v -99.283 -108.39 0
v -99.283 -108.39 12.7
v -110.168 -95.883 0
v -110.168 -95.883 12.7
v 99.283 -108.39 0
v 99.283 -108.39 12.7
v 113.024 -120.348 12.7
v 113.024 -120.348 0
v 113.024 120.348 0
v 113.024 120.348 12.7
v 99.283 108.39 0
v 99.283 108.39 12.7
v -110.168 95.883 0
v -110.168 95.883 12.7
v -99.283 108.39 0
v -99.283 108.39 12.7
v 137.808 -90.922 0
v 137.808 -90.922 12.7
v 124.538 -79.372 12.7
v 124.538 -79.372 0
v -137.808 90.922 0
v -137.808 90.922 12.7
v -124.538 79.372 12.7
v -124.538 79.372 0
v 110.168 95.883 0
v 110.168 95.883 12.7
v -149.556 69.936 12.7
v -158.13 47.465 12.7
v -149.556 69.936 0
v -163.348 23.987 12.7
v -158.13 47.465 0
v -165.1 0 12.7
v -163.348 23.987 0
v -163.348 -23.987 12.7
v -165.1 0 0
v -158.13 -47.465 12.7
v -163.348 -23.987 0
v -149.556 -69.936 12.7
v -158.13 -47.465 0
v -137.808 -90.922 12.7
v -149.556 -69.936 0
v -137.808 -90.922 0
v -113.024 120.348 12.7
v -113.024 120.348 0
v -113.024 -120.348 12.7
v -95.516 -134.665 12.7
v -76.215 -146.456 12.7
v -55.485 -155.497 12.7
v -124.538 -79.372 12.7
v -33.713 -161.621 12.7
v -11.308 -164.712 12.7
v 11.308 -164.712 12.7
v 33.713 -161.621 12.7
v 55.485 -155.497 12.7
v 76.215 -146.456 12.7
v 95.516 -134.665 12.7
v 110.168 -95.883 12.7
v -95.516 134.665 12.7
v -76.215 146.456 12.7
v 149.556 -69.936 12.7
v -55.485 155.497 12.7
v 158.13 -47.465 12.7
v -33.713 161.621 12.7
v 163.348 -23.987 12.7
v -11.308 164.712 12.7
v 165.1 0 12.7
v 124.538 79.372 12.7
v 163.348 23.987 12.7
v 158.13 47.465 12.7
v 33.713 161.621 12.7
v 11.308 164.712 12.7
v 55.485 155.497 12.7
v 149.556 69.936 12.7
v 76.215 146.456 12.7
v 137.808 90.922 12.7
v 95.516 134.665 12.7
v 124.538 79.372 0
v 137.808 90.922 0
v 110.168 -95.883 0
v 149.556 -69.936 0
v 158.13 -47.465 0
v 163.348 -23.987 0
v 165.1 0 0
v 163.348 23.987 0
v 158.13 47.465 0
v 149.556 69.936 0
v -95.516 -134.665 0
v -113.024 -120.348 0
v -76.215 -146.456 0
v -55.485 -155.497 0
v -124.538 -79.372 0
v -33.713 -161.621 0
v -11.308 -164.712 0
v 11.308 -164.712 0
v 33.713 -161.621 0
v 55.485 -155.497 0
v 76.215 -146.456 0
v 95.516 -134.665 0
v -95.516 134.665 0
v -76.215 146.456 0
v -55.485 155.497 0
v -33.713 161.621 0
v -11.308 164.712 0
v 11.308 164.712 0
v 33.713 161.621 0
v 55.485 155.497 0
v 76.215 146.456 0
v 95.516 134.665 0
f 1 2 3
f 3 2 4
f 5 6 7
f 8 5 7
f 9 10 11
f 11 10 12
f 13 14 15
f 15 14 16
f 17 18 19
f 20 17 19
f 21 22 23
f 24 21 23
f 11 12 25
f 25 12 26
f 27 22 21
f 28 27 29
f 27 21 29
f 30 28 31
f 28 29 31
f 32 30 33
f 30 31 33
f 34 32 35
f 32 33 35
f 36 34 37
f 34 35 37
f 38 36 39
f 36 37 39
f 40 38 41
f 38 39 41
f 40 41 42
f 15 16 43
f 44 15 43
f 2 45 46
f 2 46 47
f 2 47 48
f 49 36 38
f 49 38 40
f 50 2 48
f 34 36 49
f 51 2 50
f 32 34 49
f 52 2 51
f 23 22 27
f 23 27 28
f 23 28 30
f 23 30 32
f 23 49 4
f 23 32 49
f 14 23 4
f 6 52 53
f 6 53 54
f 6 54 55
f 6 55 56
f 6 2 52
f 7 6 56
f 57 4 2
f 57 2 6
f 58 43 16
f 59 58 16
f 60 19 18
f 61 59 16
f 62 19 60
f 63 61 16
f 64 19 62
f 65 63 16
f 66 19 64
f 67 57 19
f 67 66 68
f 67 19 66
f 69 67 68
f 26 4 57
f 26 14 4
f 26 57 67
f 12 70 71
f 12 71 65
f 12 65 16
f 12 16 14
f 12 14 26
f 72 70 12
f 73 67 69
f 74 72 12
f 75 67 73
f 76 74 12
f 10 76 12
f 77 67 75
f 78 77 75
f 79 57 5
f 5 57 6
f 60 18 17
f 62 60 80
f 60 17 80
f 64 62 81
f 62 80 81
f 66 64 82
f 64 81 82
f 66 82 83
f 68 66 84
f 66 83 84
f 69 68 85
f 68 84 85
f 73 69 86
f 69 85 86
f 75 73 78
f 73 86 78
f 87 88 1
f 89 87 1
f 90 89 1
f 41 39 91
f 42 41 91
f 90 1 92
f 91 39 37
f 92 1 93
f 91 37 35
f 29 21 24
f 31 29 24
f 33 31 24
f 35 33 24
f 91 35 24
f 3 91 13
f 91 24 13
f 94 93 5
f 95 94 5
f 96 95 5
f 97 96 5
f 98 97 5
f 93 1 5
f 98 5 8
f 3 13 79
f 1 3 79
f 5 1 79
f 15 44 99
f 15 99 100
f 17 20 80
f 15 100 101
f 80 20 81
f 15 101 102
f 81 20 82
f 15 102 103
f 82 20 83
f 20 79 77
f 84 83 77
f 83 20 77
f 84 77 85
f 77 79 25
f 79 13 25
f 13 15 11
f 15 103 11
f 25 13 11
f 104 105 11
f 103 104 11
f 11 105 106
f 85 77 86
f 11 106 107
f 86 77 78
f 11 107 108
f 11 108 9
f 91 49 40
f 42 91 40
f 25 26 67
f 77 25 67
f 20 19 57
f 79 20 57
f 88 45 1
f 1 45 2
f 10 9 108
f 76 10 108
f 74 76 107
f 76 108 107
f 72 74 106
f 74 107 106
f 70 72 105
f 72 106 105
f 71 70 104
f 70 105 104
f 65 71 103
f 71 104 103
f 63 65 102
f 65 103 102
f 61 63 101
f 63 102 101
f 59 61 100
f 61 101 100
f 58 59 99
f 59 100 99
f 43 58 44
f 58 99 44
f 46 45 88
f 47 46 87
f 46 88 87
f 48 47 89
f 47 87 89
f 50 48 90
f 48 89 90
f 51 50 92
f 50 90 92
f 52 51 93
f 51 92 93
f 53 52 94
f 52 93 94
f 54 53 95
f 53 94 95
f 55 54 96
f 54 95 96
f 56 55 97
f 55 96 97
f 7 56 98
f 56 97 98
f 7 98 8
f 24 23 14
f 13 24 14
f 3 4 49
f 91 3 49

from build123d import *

# Parameters (mm, degrees)
F0_R     = 165.1
F1_DEPTH = 12.7
F3_DEPTH = 25.4


with BuildPart() as f1:
    # F0 (on Top) → F1 (new body)
    with BuildSketch(Plane.XY):
        Circle(F0_R)
    extrude(amount=F1_DEPTH)

    # F2 (on face) → F3 (cut)
    with BuildSketch(Plane.XY.offset(12.7)):
        with BuildLine():
            Line((137.808496, -90.922101), (124.538028, -79.372378))
            Line((124.538028, -79.372378), (124.538028, -108.389527))
            ThreePointArc((124.538028, -108.389527), (131.463692, -99.876462), (137.808496, -90.922101))
        make_face()
        Polygon((124.538028, -108.389527), (124.538028, -79.372378), (110.168256, -95.883043), align=None)
        Polygon((110.168256, -95.883043), (99.283453, -108.389527), (124.538028, -108.389527), align=None)
        with BuildLine():
            Line((124.538028, -108.389527), (99.283453, -108.389527))
            Line((99.283453, -108.389527), (113.023665, -120.348083))
            ThreePointArc((113.023665, -120.348083), (118.931246, -114.513618), (124.538028, -108.389527))
        make_face()
        with BuildLine():
            Line((-99.283453, -108.389527), (-124.538028, -108.389527))
            ThreePointArc((-124.538028, -108.389527), (-118.931246, -114.513618), (-113.023665, -120.348083))
            Line((-113.023665, -120.348083), (-99.283453, -108.389527))
        make_face()
        Polygon((-110.168256, -95.883043), (-124.538028, -108.389527), (-99.283453, -108.389527), align=None)
        Polygon((-110.168256, -95.883043), (-124.538028, -79.372378), (-124.538028, -108.389527), align=None)
        with BuildLine():
            Line((-124.538028, -108.389527), (-124.538028, -79.372378))
            Line((-124.538028, -79.372378), (-137.808496, -90.922101))
            ThreePointArc((-137.808496, -90.922101), (-131.463692, -99.876462), (-124.538028, -108.389527))
        make_face()
        Polygon((-110.168256, 95.883043), (-124.538028, 108.389527), (-124.538028, 79.372378), align=None)
        with BuildLine():
            Line((-124.538028, 79.372378), (-124.538028, 108.389527))
            ThreePointArc((-124.538028, 108.389527), (-131.463692, 99.876462), (-137.808496, 90.922101))
            Line((-137.808496, 90.922101), (-124.538028, 79.372378))
        make_face()
        Polygon((-99.283453, 108.389527), (-124.538028, 108.389527), (-110.168256, 95.883043), align=None)
        with BuildLine():
            ThreePointArc((-113.023665, 120.348083), (-118.931246, 114.513618), (-124.538028, 108.389527))
            Line((-124.538028, 108.389527), (-99.283453, 108.389527))
            Line((-99.283453, 108.389527), (-113.023665, 120.348083))
        make_face()
        Polygon((124.538028, 108.389527), (99.283453, 108.389527), (110.168256, 95.883043), align=None)
        with BuildLine():
            Line((113.023665, 120.348083), (99.283453, 108.389527))
            Line((99.283453, 108.389527), (124.538028, 108.389527))
            ThreePointArc((124.538028, 108.389527), (118.931246, 114.513618), (113.023665, 120.348083))
        make_face()
        Polygon((124.538028, 79.372378), (124.538028, 108.389527), (110.168256, 95.883043), align=None)
        with BuildLine():
            ThreePointArc((137.808496, 90.922101), (131.463692, 99.876462), (124.538028, 108.389527))
            Line((124.538028, 108.389527), (124.538028, 79.372378))
            Line((124.538028, 79.372378), (137.808496, 90.922101))
        make_face()
    extrude(amount=-F3_DEPTH, mode=Mode.SUBTRACT)


solid = f1.part
